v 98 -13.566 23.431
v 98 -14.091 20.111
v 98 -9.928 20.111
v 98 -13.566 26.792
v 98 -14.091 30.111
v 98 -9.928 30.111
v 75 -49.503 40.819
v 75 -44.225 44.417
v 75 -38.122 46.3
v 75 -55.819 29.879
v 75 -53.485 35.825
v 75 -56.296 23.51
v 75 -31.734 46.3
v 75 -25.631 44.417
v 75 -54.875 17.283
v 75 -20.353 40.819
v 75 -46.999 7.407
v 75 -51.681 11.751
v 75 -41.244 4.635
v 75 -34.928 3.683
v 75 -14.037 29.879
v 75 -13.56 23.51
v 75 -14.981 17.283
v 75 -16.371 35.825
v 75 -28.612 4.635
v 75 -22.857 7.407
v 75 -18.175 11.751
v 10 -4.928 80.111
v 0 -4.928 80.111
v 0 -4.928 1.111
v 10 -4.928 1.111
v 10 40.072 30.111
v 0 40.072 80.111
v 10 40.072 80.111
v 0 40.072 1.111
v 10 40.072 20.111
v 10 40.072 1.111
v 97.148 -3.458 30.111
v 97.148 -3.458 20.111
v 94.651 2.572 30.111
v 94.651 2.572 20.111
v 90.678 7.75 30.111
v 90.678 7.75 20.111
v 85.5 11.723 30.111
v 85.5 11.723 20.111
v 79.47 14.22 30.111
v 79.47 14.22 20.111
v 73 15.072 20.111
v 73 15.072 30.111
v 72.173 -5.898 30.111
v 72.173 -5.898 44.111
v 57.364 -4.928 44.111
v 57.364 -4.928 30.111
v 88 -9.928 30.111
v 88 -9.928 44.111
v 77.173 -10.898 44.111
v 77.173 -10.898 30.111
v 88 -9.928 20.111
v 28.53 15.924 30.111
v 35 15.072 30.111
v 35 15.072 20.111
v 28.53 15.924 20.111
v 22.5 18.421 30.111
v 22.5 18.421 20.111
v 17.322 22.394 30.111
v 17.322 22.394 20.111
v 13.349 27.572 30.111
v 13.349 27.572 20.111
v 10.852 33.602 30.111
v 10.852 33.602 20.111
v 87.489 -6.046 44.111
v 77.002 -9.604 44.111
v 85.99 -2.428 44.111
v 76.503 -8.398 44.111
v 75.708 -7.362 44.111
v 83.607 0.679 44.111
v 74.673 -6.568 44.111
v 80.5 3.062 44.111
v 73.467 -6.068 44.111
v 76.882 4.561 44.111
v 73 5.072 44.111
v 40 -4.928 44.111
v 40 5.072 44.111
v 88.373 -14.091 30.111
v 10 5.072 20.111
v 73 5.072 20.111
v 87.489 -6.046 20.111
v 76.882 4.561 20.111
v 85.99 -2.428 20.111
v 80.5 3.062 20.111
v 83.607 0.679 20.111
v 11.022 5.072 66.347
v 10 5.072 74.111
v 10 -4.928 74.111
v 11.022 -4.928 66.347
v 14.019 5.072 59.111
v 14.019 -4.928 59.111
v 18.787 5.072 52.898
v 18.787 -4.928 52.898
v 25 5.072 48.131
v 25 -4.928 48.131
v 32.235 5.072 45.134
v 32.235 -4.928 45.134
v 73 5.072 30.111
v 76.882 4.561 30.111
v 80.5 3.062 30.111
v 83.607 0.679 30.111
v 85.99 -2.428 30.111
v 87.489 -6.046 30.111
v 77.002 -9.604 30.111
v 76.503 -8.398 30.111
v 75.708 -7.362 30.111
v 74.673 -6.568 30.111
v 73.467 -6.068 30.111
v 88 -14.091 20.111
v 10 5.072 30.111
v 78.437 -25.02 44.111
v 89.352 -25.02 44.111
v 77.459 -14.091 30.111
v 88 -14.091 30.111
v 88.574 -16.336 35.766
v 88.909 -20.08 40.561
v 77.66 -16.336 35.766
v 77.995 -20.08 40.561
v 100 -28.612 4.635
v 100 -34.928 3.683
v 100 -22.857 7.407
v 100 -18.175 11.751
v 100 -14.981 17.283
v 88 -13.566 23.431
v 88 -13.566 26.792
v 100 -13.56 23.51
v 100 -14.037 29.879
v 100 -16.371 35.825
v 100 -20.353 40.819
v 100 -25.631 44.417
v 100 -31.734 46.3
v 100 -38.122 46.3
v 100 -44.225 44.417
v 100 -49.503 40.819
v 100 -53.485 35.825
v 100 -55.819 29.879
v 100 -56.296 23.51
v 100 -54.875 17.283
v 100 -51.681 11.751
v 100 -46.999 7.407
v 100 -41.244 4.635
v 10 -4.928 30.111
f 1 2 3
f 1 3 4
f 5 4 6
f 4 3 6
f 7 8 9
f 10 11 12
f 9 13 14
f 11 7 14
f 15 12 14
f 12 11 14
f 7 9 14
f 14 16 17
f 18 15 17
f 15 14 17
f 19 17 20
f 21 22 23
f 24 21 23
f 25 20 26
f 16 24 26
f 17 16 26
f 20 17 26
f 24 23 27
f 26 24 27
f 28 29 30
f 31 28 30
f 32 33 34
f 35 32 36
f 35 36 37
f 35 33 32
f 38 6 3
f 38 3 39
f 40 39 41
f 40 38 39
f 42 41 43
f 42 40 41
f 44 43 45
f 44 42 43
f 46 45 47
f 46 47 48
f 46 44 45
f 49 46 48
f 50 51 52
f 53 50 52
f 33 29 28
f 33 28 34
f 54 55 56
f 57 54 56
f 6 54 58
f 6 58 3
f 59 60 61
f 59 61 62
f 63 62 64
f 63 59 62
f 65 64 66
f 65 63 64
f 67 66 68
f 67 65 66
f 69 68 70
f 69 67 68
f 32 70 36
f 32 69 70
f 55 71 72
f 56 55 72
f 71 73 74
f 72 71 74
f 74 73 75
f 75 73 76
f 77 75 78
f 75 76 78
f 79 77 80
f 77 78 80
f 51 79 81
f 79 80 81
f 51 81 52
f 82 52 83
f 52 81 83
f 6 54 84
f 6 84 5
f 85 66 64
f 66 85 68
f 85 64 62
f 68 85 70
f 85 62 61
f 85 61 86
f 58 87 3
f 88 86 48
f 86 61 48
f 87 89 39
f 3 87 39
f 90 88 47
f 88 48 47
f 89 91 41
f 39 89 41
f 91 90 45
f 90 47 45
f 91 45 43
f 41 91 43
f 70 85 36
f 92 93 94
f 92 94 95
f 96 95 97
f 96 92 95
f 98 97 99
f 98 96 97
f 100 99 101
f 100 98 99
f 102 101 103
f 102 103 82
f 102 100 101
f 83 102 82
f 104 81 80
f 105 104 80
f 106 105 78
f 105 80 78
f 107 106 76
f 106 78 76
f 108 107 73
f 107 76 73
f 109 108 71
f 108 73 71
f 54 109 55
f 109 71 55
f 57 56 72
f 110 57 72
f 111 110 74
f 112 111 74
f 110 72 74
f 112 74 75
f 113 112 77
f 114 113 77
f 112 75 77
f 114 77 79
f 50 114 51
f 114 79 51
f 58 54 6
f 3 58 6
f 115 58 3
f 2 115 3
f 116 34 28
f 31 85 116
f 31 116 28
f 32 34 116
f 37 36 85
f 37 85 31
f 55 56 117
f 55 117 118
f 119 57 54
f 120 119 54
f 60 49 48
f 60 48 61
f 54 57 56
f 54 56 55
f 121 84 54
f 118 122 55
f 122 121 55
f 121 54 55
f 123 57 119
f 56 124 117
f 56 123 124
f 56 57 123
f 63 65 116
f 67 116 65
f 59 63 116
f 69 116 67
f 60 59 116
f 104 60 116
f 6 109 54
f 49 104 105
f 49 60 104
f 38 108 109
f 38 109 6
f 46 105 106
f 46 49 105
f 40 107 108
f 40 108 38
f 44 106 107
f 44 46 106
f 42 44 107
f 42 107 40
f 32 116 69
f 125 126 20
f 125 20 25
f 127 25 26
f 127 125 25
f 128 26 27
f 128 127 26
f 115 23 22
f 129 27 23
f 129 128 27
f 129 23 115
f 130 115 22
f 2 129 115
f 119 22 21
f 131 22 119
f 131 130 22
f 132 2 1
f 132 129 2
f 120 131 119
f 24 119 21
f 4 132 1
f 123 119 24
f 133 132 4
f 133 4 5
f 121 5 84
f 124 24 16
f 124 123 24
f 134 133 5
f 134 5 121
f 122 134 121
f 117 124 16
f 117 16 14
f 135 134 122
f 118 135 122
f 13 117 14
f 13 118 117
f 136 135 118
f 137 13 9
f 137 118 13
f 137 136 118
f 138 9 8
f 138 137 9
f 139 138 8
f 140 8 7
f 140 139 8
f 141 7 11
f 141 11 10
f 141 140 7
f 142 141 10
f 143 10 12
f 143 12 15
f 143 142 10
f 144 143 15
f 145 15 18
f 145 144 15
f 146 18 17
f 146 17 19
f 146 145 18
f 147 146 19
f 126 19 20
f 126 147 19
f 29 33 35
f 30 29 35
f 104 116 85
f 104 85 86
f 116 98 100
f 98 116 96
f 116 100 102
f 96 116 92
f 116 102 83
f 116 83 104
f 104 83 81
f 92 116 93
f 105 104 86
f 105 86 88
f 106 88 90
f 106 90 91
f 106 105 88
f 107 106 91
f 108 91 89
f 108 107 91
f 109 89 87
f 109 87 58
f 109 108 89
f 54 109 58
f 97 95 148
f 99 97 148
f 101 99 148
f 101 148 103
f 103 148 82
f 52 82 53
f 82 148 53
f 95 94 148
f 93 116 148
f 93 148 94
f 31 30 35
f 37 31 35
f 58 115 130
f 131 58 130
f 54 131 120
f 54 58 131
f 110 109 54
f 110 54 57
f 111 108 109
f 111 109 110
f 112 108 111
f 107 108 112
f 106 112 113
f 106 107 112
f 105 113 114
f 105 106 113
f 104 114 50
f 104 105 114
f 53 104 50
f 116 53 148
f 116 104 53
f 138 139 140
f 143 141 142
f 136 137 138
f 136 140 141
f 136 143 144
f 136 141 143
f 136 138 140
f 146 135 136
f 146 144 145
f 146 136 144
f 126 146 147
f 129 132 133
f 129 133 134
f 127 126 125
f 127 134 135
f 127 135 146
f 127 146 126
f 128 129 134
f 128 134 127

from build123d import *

# Parameters (mm, degrees)
SKETCH1_W            = 79
SKETCH1_H            = 45
BOSS_EXTRUDE1_DEPTH  = 10
BOSS_EXTRUDE2_DEPTH  = 10
BOSS_EXTRUDE11_DEPTH = 10
BOSS_EXTRUDE12_START = 14
BOSS_EXTRUDE12_DEPTH = 14
SKETCH8_R            = 16
BOSS_EXTRUDE15_DEPTH = 23
SKETCH11_R           = 16
BOSS_EXTRUDE16_DEPTH = 2
SKETCH14_W           = 10
SKETCH14_H           = 10
BOSS_EXTRUDE20_DEPTH = 11
SKETCH15_W           = 10.870824636
SKETCH15_H           = 14
BOSS_EXTRUDE21_DEPTH = 29
SKETCH16_R           = 21.427999152
BOSS_EXTRUDE22_DEPTH = 25


with BuildPart() as part:
    # Sketch1 → Boss-Extrude1 (new body)
    with BuildSketch(Plane(origin=(0, 0, 0), x_dir=(0, 0, -1), z_dir=(1, 0, 0))):
        with Locations((-40.611276675, 17.572019258)):
            Rectangle(SKETCH1_W, SKETCH1_H)
    extrude(amount=BOSS_EXTRUDE1_DEPTH)

    # Sketch3 → Boss-Extrude2 (add)
    with BuildSketch(Plane.XY.offset(30.111276675)):
        with BuildLine():
            ThreePointArc((35, 15.072019258), (17.32233047, 22.394349729), (10, 40.072019258))
            Line((10, 40.072019258), (10, 15.072019258))
            Line((10, 15.072019258), (10, 5.072019258))
            Line((10, 5.072019258), (73, 5.072019258))
            ThreePointArc((73, 5.072019258), (83.606601718, 0.678620976), (88, -9.927980742))
            Line((88, -9.927980742), (98, -9.927980742))
            ThreePointArc((98, -9.927980742), (90.67766953, 7.749688788), (73, 15.072019258))
            Line((73, 15.072019258), (35, 15.072019258))
        make_face()
    extrude(amount=-BOSS_EXTRUDE2_DEPTH)


with BuildPart() as body_2:
    # Sketch5 → Boss-Extrude11 (new body)
    with BuildSketch(Plane(origin=(0, 5.072019258, 0), x_dir=(1, 0, 0), z_dir=(0, 1, 0))):
        with BuildLine():
            Line((57.363847246, -30.111276675), (10, -30.111276675))
            Line((10, -30.111276675), (10, -74.111276675))
            ThreePointArc((10, -74.111276675), (18.786796564, -52.898073239), (40, -44.111276675))
            Line((40, -44.111276675), (57.363847246, -44.111276675))
            Line((57.363847246, -44.111276675), (57.363847246, -30.111276675))
        make_face()
    extrude(amount=-BOSS_EXTRUDE11_DEPTH)

    # Sketch7 → Boss-Extrude12 (add)
    with BuildSketch(Plane.XY.offset(30.111276675).offset(BOSS_EXTRUDE12_START)):
        with BuildLine():
            Line((57.363847246, 5.072019258), (73, 5.072019258))
            ThreePointArc((73, 5.072019258), (83.606601718, 0.678620976), (88, -9.927980742))
            Line((88, -9.927980742), (77.17250833, -10.897646868))
            ThreePointArc((77.17250833, -10.897646868), (75.708042236, -7.362112962), (72.17250833, -5.897646868))
            Line((72.17250833, -5.897646868), (57.363847246, -4.927980742))
            Line((57.363847246, -4.927980742), (57.363847246, 5.072019258))
        make_face()
    extrude(amount=-BOSS_EXTRUDE12_DEPTH)


with BuildPart() as body_3:
    # Sketch8 → Boss-Extrude15 (new body)
    with BuildSketch(Plane(origin=(98, 0, 0), x_dir=(0, 0, -1), z_dir=(1, 0, 0))):
        with Locations((-25.111276675, -34.927980742)):
            Circle(SKETCH8_R)
    extrude(amount=-BOSS_EXTRUDE15_DEPTH)

    # Sketch11 → Boss-Extrude16 (add)
    with BuildSketch(Plane(origin=(98, 0, 0), x_dir=(0, 0, -1), z_dir=(1, 0, 0))):
        with Locations((-25.111276675, -34.927980742)):
            Circle(SKETCH11_R)
    extrude(amount=BOSS_EXTRUDE16_DEPTH)



with BuildPart() as body_4:
    # Sketch14 → Boss-Extrude20 (new body)
    with BuildSketch(Plane.XZ.offset(9.927980742)):
        with Locations((93, 25.111276675)):
            Rectangle(SKETCH14_W, SKETCH14_H)
    extrude(amount=BOSS_EXTRUDE20_DEPTH)


with BuildPart() as body_5:
    # Sketch15 → Boss-Extrude21 (new body)
    with BuildSketch(Plane(origin=(1.582203238, -17.667207218, 0), x_dir=(0.996013829020688, 0.08919894842176003, 0), z_dir=(0.08919894842176003, -0.996013829020688, 0))):
        with Locations((81.328239194, 37.111276675)):
            Rectangle(SKETCH15_W, SKETCH15_H)
    extrude(amount=BOSS_EXTRUDE21_DEPTH)


with BuildPart() as body_3_1:
    add(body_3.part)

    add(body_4.part)  # Boss-Extrude22 merges body 4

    add(body_5.part)  # Boss-Extrude22 merges body 5
    # Sketch16 → Boss-Extrude22 (add)
    with BuildSketch(Plane(origin=(100, 0, 0), x_dir=(0, 0, -1), z_dir=(1, 0, 0))):
        with Locations((-25.111276675, -34.927980742)):
            Circle(SKETCH16_R)
    extrude(amount=-BOSS_EXTRUDE22_DEPTH)


solid = Compound([part.part, body_2.part, body_3_1.part])
